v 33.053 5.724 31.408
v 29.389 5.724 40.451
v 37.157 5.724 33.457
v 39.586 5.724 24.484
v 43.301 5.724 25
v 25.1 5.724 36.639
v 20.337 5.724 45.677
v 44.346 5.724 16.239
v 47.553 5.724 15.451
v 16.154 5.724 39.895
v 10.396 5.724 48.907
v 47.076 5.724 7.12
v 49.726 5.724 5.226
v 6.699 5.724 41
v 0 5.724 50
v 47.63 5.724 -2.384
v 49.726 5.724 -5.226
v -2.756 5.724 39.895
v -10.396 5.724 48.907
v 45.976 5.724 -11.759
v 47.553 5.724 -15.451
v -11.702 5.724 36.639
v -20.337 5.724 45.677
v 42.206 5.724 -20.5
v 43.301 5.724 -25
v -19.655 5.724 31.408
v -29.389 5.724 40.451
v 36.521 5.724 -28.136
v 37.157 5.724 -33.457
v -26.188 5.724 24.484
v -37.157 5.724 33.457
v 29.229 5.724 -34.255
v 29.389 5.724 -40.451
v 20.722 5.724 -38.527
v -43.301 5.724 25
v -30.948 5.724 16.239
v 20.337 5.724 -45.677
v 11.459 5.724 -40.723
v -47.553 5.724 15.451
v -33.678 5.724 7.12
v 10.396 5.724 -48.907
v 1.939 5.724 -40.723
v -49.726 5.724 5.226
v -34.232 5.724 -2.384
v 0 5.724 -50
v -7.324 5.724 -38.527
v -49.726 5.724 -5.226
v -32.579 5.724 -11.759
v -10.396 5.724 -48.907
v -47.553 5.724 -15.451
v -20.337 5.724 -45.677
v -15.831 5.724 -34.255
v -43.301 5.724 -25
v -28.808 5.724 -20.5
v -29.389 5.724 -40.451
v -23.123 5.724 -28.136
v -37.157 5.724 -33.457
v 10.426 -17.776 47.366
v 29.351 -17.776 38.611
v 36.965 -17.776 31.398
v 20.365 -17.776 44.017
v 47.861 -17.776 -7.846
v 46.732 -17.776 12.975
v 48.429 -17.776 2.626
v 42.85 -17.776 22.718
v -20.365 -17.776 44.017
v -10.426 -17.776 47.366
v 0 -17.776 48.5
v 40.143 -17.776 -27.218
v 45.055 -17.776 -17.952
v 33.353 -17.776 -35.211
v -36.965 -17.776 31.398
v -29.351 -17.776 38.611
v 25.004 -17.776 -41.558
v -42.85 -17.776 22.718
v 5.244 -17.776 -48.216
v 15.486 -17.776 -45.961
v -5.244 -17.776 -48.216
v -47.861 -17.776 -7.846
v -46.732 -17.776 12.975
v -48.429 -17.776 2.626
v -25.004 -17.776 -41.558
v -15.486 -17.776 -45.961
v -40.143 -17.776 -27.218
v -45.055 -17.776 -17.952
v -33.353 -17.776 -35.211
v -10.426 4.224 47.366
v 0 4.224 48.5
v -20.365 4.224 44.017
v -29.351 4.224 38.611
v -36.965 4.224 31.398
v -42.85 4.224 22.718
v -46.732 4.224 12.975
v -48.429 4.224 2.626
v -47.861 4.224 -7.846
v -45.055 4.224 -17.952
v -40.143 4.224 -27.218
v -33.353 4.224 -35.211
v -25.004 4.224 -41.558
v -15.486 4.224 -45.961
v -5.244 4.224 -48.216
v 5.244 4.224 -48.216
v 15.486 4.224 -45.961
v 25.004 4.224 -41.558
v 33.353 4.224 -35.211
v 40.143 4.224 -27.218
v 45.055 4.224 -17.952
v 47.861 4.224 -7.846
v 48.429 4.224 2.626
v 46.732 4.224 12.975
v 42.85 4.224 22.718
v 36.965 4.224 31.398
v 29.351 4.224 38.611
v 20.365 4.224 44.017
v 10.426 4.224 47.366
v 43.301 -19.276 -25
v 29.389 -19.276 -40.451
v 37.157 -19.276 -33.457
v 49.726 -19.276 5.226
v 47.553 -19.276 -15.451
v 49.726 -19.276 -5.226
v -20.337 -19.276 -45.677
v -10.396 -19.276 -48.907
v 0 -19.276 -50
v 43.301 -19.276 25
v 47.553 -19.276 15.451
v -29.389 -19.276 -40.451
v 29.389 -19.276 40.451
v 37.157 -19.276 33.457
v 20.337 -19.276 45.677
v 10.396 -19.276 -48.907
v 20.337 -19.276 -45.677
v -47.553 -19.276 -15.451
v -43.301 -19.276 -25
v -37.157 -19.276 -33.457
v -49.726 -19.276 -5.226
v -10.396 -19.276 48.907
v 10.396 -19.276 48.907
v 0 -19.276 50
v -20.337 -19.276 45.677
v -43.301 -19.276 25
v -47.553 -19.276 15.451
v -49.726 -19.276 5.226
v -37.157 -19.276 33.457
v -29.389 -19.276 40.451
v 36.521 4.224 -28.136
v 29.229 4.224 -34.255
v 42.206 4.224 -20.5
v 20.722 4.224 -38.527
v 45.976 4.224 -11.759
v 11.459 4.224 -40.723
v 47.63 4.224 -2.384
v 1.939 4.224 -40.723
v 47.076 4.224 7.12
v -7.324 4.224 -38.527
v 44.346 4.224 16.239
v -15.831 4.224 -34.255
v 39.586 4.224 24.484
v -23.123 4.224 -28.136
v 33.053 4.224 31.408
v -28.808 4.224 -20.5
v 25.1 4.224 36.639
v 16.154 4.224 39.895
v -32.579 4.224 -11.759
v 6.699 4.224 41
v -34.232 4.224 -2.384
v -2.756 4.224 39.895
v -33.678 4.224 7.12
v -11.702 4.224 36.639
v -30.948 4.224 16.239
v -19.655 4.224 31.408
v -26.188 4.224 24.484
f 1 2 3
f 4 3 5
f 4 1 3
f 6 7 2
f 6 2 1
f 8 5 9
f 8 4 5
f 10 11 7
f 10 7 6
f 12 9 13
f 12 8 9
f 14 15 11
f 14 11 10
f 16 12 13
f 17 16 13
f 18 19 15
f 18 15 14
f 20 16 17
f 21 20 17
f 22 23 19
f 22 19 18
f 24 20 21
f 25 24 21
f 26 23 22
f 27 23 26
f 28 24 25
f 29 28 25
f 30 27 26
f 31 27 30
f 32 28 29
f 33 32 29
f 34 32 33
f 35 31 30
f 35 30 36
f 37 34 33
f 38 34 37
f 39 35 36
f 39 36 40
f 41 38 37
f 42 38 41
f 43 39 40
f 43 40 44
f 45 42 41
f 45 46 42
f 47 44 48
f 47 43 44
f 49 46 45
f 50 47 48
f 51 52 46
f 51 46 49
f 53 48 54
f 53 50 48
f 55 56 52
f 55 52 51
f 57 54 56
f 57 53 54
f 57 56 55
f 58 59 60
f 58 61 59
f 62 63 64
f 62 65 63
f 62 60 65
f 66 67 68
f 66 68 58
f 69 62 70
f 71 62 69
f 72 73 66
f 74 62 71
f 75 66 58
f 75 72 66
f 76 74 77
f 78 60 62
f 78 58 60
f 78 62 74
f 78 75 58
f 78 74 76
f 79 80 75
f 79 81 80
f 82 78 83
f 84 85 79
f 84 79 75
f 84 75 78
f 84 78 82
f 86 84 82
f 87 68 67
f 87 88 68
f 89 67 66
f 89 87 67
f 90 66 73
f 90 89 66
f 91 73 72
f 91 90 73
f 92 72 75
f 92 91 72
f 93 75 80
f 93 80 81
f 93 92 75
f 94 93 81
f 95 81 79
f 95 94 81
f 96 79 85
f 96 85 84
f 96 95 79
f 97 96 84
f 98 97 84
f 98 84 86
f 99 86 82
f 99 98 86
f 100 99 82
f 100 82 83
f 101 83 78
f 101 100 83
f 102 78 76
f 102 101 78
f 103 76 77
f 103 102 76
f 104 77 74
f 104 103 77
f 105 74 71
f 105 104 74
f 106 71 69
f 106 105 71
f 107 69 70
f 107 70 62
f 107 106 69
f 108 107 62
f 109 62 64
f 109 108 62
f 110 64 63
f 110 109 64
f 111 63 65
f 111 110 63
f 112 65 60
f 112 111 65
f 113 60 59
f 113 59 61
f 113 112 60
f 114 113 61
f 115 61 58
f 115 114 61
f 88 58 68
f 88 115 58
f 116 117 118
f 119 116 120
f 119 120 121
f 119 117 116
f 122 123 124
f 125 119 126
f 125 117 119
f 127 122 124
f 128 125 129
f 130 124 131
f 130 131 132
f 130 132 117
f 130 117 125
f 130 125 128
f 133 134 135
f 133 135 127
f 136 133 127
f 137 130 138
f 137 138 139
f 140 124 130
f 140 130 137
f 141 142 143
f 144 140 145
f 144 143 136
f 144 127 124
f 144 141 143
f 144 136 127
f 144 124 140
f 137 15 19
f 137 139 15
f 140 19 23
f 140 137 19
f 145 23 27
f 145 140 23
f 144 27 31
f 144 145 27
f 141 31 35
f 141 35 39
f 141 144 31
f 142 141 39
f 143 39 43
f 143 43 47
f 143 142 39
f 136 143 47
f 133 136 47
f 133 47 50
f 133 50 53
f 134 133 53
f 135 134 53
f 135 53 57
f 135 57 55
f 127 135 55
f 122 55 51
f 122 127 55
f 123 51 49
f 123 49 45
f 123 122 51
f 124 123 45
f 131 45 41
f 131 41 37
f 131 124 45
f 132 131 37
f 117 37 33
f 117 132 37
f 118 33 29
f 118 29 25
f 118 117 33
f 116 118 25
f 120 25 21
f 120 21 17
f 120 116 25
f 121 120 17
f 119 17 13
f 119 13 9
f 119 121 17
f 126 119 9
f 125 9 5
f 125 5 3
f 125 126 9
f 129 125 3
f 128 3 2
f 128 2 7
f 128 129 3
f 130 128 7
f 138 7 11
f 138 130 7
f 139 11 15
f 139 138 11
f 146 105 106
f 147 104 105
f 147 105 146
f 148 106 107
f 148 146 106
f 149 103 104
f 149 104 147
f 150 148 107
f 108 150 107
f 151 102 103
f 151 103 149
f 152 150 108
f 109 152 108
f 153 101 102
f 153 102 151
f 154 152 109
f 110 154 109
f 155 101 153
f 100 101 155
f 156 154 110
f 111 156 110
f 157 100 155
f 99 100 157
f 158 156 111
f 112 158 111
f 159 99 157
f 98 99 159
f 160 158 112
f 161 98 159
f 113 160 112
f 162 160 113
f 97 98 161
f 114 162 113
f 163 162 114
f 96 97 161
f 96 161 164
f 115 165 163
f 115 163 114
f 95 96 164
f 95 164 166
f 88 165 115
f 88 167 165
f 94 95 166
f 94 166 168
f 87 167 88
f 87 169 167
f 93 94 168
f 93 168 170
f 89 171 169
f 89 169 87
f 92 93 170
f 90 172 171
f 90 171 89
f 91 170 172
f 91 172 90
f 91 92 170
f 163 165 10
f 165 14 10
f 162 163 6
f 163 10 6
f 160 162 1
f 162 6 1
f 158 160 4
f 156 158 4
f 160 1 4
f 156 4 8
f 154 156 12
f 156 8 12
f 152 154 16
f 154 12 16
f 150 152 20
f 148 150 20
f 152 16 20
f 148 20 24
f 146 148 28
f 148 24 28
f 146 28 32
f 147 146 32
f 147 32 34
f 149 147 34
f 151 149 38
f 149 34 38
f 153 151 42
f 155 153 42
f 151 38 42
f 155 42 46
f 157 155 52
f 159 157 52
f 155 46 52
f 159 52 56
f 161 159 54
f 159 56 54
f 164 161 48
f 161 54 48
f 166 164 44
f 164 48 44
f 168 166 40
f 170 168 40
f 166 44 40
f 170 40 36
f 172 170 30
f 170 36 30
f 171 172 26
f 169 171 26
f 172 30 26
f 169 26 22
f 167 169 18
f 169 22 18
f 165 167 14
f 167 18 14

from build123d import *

# Parameters (mm, degrees)
SKETCH_3_R          = 41
CUT_EXTRUDE_2_DEPTH = 6


with BuildPart() as part:
    # 草图2 → 旋转-薄壁6 (revolve)
    with BuildSketch(Plane.XY, mode=Mode.PRIVATE) as revolve_6_sk:
        Polygon((0, 5.723684211), (50, 5.723684211), (50, -19.276315789), (0, -19.276315789), (0, -17.776315789), (48.5, -17.776315789), (48.5, 4.223684211), (0, 4.223684211), align=None)
    revolve(revolve_6_sk.sketch.rotate(Axis((0, 38.419124221, 0), (0, -1, 0)), 90), axis=Axis((0, 38.419124221, 0), (0, -1, 0)))

    # 草图3 → 切除-拉伸2 (cut, symmetric)
    with BuildSketch(Plane(origin=(0, 0, 0), x_dir=(1, 0, 0), z_dir=(0, 1, 0))):
        with Locations(Location((6.69886917, 0, 0), (0, 0, 270))):
            Circle(SKETCH_3_R)
    extrude(amount=CUT_EXTRUDE_2_DEPTH, both=True, mode=Mode.SUBTRACT)


solid = part.part
